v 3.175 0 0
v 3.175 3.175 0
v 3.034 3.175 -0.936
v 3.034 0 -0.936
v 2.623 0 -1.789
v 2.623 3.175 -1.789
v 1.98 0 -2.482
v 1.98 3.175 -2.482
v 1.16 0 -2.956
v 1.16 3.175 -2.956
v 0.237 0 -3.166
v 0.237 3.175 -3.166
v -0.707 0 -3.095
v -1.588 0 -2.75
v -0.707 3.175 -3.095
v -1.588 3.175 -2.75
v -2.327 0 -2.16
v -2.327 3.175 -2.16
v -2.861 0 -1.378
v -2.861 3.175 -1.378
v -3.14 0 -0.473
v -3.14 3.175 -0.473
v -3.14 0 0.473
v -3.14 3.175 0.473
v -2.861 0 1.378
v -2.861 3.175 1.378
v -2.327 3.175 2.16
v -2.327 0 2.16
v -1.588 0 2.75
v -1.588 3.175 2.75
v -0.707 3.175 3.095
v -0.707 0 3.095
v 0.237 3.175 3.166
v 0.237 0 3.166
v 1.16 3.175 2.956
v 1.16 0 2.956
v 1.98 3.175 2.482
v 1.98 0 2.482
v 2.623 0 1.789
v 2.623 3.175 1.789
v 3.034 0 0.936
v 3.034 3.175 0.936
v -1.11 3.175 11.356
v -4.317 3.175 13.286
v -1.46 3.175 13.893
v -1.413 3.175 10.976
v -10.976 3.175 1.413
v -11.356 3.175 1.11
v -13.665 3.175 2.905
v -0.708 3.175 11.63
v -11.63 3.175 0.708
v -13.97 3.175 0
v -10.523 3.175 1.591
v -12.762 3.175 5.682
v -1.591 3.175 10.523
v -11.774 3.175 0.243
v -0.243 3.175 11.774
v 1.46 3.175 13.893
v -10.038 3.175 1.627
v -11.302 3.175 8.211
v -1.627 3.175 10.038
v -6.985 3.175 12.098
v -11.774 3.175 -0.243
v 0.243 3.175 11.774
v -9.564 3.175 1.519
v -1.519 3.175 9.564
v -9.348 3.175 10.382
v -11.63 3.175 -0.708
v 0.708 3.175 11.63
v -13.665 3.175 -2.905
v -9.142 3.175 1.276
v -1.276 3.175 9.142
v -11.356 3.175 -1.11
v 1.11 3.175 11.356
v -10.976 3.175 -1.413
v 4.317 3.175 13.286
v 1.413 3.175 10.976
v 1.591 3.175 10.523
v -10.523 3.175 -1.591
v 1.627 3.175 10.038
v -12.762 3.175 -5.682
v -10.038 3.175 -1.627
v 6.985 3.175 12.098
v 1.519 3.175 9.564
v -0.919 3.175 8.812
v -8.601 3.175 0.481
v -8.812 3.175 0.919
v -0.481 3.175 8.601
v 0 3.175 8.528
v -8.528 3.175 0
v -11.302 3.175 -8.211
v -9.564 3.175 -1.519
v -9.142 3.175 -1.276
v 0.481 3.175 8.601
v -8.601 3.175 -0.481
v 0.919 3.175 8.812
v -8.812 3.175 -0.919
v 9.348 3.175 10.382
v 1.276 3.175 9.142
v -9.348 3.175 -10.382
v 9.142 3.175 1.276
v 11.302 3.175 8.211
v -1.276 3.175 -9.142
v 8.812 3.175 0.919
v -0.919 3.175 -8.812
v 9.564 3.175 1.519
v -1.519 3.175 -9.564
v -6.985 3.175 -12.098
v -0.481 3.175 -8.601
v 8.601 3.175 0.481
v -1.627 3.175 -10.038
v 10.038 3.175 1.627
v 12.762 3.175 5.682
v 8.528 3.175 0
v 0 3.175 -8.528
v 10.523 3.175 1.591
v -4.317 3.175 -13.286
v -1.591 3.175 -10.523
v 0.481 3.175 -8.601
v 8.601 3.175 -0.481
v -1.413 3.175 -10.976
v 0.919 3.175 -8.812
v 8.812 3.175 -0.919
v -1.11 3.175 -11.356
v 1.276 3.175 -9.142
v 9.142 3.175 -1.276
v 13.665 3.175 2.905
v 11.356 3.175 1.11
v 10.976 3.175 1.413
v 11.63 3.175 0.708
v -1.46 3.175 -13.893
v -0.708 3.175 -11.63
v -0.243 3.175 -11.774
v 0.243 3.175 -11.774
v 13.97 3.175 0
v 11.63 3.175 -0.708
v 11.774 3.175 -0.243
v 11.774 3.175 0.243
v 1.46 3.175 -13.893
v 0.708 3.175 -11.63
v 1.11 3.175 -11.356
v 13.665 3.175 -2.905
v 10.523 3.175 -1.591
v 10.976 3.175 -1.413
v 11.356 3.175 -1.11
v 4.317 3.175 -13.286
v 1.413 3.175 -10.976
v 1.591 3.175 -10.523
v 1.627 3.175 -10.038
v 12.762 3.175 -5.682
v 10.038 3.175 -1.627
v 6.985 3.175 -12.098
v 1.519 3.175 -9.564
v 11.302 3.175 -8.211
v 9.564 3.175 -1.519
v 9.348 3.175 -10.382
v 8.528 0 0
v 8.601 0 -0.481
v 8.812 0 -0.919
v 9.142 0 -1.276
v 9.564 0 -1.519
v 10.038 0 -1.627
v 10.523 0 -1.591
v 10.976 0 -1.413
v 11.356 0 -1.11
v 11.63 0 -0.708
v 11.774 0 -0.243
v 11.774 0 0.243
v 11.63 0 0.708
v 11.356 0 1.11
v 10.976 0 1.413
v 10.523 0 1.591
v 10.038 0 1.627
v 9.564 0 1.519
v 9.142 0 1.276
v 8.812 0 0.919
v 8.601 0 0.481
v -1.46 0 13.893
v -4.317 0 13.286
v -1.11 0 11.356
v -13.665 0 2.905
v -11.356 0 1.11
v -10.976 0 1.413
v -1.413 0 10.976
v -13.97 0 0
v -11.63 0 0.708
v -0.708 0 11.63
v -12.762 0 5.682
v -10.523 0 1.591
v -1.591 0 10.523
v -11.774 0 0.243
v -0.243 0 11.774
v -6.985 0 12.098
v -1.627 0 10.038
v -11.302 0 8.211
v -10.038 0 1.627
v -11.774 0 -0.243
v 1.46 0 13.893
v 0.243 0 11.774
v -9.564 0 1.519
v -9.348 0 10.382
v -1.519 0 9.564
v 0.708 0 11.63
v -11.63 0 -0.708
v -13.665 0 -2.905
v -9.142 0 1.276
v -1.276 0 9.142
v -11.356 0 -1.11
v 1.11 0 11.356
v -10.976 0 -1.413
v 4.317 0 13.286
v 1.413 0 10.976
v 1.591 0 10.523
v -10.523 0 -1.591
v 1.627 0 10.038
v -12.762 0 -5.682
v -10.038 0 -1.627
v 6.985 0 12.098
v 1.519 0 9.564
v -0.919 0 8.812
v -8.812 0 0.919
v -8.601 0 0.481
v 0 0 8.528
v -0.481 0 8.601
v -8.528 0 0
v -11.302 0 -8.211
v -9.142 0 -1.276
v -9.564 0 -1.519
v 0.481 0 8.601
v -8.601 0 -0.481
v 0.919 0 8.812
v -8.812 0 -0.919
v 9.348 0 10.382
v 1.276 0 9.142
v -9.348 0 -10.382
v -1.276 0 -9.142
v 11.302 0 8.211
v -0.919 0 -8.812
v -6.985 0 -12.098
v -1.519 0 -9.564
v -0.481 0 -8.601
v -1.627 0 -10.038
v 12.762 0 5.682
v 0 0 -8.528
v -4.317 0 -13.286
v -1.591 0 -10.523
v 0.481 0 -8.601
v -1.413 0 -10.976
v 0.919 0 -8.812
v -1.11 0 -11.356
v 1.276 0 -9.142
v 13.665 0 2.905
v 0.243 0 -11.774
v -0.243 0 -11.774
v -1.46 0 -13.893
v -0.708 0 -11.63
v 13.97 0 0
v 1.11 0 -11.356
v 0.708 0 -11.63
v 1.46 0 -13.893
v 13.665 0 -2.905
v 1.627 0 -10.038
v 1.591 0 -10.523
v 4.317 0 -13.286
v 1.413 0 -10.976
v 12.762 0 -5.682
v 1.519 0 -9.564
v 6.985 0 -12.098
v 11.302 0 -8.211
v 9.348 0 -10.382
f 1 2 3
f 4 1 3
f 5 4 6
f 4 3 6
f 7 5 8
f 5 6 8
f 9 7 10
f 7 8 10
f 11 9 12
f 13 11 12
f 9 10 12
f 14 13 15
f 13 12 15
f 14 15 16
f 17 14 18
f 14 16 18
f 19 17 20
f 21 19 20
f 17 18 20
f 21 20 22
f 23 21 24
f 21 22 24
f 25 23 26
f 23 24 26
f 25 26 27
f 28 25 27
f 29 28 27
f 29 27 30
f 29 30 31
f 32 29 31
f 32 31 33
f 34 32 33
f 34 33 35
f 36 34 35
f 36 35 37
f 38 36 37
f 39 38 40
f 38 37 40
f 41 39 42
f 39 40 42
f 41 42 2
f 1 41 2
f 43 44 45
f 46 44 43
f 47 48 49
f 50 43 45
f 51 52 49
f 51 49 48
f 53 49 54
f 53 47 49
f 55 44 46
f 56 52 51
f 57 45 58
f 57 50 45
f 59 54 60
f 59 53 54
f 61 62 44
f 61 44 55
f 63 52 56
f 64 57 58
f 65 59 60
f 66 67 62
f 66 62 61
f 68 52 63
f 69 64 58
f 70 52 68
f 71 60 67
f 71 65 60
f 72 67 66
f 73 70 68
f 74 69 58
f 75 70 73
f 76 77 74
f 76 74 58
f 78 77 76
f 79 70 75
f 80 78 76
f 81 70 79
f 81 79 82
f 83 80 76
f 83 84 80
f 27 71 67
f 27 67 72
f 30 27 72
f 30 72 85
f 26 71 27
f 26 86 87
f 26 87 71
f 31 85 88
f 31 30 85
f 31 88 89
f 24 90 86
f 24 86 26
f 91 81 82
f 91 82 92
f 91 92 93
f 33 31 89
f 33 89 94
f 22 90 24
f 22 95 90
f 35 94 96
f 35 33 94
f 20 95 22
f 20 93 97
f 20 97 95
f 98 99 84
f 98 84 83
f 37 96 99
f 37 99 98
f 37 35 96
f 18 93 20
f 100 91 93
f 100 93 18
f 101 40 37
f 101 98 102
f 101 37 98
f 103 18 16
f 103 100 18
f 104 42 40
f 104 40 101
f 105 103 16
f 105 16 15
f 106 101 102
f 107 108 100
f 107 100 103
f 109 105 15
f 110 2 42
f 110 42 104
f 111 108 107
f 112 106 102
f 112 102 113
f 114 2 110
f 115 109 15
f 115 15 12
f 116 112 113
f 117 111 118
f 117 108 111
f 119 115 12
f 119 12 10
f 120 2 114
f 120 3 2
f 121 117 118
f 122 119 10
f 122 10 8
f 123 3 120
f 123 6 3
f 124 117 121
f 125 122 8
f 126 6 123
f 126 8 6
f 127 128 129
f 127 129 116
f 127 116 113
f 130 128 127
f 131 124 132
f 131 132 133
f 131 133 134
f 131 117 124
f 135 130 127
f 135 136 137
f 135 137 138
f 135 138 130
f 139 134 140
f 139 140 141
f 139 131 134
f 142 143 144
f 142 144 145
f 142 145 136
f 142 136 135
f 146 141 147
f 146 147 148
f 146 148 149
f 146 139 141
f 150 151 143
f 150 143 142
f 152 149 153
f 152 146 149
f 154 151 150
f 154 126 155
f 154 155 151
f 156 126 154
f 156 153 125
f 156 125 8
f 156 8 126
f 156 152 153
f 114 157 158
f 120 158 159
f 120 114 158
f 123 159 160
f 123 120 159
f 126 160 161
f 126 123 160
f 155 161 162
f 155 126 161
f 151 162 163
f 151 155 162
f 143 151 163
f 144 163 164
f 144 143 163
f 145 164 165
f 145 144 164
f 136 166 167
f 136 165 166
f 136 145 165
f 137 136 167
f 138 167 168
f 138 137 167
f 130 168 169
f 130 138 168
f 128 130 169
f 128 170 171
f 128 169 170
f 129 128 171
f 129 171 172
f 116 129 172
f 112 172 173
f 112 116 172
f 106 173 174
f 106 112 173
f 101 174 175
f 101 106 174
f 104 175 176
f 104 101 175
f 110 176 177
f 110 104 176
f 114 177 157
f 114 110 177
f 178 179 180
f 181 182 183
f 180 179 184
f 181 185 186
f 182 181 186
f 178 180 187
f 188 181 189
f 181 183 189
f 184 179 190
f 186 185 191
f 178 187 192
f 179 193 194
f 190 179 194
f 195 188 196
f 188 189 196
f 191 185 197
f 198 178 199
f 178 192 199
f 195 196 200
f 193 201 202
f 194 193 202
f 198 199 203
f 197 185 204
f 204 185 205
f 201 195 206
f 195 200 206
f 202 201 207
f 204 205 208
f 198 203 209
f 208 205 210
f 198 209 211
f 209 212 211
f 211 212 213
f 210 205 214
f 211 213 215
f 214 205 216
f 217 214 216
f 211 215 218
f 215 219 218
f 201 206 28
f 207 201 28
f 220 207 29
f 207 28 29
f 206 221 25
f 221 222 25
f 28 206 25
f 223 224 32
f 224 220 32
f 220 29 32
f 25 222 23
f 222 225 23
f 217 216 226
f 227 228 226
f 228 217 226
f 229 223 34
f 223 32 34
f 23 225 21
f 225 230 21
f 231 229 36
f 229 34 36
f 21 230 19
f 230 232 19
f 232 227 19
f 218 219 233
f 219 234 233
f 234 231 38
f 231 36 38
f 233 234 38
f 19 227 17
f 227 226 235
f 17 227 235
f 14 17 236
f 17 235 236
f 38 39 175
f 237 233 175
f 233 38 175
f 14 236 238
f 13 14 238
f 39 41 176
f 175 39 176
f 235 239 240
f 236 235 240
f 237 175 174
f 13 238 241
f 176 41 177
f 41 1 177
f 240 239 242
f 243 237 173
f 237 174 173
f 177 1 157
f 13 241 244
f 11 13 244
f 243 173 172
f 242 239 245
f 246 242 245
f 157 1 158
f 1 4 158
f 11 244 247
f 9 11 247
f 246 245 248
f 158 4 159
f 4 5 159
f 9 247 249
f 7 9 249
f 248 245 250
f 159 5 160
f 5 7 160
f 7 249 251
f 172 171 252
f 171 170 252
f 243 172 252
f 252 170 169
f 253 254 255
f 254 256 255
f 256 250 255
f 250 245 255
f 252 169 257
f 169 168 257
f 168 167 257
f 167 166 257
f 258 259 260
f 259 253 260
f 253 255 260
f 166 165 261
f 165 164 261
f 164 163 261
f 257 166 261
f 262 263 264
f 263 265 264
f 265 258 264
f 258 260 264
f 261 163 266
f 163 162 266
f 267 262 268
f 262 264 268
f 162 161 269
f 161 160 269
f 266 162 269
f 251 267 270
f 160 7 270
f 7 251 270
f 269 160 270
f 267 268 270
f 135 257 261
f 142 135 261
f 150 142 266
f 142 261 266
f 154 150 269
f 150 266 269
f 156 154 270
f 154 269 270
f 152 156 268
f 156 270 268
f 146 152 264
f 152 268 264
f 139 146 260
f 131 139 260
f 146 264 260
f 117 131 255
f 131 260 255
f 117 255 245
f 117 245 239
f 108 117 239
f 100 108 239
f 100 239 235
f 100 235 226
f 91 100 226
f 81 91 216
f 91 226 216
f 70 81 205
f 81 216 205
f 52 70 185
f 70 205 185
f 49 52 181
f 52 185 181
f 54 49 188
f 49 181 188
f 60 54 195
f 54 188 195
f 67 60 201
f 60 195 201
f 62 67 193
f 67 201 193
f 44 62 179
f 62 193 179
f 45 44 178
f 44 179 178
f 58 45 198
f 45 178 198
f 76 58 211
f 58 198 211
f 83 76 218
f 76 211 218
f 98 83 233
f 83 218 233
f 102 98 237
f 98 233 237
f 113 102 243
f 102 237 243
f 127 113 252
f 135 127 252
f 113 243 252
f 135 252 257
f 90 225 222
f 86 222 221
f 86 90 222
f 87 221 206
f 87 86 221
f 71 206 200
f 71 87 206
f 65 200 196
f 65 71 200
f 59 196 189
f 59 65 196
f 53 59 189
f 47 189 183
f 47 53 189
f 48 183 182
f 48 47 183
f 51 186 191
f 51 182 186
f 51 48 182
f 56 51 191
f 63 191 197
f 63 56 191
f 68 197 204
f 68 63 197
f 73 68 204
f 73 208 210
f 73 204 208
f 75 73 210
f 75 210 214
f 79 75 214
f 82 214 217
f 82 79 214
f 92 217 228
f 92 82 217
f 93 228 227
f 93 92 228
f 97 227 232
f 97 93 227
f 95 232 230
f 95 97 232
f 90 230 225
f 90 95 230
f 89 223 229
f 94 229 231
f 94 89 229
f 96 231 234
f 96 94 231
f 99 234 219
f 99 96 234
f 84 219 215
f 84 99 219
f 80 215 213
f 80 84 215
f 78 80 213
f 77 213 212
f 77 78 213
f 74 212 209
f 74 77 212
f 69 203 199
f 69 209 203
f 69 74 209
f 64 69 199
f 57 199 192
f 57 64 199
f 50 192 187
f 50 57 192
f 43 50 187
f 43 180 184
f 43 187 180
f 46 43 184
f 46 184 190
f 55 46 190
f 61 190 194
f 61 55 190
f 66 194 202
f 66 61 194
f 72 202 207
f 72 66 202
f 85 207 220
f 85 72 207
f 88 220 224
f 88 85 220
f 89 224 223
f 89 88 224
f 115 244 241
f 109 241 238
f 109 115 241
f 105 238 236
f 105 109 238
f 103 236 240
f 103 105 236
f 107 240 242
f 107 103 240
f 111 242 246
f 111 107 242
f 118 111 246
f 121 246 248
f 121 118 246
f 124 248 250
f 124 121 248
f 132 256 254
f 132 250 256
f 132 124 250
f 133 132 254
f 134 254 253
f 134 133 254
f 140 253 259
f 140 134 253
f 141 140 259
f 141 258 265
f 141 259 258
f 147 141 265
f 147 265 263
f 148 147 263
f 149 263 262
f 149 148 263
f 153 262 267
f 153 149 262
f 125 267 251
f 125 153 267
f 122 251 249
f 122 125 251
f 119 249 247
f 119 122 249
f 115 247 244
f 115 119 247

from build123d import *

# Parameters (mm, degrees)
SKETCH1_R           = 13.97
BOSS_EXTRUDE1_DEPTH = 3.175
SKETCH2_R           = 3.175
CUT_EXTRUDE1_DEPTH  = 3.175
CIRPATTERN1_COUNT   = 4


with BuildPart() as part:
    # Sketch1 → Boss-Extrude1 (new body)
    with BuildSketch(Plane(origin=(0, 0, 0), x_dir=(1, 0, 0), z_dir=(0, 1, 0))):
        Circle(SKETCH1_R)
    extrude(amount=BOSS_EXTRUDE1_DEPTH)

    # Sketch2 → Cut-Extrude1 (cut)
    with BuildSketch(Plane(origin=(0, 3.175, 0), x_dir=(1, 0, 0), z_dir=(0, 1, 0))):
        Circle(SKETCH2_R)
    extrude(amount=-CUT_EXTRUDE1_DEPTH, mode=Mode.SUBTRACT)

    # Sketch3 → #4 Clearance Hole1 (revolve, cut)
    with BuildSketch(Plane(origin=(0, 3.175, -10.16), x_dir=(0, 0, 1), z_dir=(1, 0, 0))):
        Polygon((0, 0), (0, 11.140574487), (1.63195, 10.16), (1.63195, 0), align=None)
    f_4_clearance_hole1 = revolve(axis=Axis((0, 9.525, -10.16), (0, -1, 0)), mode=Mode.SUBTRACT)

    # CirPattern1: #4 Clearance Hole1 ×4 about axis
    cirpattern1_axis = Axis((0, 0, 0), (0, 1, 0))
    for i in range(1, CIRPATTERN1_COUNT):
        add(f_4_clearance_hole1.rotate(cirpattern1_axis, i * 360 / CIRPATTERN1_COUNT), mode=Mode.SUBTRACT)


solid = part.part
